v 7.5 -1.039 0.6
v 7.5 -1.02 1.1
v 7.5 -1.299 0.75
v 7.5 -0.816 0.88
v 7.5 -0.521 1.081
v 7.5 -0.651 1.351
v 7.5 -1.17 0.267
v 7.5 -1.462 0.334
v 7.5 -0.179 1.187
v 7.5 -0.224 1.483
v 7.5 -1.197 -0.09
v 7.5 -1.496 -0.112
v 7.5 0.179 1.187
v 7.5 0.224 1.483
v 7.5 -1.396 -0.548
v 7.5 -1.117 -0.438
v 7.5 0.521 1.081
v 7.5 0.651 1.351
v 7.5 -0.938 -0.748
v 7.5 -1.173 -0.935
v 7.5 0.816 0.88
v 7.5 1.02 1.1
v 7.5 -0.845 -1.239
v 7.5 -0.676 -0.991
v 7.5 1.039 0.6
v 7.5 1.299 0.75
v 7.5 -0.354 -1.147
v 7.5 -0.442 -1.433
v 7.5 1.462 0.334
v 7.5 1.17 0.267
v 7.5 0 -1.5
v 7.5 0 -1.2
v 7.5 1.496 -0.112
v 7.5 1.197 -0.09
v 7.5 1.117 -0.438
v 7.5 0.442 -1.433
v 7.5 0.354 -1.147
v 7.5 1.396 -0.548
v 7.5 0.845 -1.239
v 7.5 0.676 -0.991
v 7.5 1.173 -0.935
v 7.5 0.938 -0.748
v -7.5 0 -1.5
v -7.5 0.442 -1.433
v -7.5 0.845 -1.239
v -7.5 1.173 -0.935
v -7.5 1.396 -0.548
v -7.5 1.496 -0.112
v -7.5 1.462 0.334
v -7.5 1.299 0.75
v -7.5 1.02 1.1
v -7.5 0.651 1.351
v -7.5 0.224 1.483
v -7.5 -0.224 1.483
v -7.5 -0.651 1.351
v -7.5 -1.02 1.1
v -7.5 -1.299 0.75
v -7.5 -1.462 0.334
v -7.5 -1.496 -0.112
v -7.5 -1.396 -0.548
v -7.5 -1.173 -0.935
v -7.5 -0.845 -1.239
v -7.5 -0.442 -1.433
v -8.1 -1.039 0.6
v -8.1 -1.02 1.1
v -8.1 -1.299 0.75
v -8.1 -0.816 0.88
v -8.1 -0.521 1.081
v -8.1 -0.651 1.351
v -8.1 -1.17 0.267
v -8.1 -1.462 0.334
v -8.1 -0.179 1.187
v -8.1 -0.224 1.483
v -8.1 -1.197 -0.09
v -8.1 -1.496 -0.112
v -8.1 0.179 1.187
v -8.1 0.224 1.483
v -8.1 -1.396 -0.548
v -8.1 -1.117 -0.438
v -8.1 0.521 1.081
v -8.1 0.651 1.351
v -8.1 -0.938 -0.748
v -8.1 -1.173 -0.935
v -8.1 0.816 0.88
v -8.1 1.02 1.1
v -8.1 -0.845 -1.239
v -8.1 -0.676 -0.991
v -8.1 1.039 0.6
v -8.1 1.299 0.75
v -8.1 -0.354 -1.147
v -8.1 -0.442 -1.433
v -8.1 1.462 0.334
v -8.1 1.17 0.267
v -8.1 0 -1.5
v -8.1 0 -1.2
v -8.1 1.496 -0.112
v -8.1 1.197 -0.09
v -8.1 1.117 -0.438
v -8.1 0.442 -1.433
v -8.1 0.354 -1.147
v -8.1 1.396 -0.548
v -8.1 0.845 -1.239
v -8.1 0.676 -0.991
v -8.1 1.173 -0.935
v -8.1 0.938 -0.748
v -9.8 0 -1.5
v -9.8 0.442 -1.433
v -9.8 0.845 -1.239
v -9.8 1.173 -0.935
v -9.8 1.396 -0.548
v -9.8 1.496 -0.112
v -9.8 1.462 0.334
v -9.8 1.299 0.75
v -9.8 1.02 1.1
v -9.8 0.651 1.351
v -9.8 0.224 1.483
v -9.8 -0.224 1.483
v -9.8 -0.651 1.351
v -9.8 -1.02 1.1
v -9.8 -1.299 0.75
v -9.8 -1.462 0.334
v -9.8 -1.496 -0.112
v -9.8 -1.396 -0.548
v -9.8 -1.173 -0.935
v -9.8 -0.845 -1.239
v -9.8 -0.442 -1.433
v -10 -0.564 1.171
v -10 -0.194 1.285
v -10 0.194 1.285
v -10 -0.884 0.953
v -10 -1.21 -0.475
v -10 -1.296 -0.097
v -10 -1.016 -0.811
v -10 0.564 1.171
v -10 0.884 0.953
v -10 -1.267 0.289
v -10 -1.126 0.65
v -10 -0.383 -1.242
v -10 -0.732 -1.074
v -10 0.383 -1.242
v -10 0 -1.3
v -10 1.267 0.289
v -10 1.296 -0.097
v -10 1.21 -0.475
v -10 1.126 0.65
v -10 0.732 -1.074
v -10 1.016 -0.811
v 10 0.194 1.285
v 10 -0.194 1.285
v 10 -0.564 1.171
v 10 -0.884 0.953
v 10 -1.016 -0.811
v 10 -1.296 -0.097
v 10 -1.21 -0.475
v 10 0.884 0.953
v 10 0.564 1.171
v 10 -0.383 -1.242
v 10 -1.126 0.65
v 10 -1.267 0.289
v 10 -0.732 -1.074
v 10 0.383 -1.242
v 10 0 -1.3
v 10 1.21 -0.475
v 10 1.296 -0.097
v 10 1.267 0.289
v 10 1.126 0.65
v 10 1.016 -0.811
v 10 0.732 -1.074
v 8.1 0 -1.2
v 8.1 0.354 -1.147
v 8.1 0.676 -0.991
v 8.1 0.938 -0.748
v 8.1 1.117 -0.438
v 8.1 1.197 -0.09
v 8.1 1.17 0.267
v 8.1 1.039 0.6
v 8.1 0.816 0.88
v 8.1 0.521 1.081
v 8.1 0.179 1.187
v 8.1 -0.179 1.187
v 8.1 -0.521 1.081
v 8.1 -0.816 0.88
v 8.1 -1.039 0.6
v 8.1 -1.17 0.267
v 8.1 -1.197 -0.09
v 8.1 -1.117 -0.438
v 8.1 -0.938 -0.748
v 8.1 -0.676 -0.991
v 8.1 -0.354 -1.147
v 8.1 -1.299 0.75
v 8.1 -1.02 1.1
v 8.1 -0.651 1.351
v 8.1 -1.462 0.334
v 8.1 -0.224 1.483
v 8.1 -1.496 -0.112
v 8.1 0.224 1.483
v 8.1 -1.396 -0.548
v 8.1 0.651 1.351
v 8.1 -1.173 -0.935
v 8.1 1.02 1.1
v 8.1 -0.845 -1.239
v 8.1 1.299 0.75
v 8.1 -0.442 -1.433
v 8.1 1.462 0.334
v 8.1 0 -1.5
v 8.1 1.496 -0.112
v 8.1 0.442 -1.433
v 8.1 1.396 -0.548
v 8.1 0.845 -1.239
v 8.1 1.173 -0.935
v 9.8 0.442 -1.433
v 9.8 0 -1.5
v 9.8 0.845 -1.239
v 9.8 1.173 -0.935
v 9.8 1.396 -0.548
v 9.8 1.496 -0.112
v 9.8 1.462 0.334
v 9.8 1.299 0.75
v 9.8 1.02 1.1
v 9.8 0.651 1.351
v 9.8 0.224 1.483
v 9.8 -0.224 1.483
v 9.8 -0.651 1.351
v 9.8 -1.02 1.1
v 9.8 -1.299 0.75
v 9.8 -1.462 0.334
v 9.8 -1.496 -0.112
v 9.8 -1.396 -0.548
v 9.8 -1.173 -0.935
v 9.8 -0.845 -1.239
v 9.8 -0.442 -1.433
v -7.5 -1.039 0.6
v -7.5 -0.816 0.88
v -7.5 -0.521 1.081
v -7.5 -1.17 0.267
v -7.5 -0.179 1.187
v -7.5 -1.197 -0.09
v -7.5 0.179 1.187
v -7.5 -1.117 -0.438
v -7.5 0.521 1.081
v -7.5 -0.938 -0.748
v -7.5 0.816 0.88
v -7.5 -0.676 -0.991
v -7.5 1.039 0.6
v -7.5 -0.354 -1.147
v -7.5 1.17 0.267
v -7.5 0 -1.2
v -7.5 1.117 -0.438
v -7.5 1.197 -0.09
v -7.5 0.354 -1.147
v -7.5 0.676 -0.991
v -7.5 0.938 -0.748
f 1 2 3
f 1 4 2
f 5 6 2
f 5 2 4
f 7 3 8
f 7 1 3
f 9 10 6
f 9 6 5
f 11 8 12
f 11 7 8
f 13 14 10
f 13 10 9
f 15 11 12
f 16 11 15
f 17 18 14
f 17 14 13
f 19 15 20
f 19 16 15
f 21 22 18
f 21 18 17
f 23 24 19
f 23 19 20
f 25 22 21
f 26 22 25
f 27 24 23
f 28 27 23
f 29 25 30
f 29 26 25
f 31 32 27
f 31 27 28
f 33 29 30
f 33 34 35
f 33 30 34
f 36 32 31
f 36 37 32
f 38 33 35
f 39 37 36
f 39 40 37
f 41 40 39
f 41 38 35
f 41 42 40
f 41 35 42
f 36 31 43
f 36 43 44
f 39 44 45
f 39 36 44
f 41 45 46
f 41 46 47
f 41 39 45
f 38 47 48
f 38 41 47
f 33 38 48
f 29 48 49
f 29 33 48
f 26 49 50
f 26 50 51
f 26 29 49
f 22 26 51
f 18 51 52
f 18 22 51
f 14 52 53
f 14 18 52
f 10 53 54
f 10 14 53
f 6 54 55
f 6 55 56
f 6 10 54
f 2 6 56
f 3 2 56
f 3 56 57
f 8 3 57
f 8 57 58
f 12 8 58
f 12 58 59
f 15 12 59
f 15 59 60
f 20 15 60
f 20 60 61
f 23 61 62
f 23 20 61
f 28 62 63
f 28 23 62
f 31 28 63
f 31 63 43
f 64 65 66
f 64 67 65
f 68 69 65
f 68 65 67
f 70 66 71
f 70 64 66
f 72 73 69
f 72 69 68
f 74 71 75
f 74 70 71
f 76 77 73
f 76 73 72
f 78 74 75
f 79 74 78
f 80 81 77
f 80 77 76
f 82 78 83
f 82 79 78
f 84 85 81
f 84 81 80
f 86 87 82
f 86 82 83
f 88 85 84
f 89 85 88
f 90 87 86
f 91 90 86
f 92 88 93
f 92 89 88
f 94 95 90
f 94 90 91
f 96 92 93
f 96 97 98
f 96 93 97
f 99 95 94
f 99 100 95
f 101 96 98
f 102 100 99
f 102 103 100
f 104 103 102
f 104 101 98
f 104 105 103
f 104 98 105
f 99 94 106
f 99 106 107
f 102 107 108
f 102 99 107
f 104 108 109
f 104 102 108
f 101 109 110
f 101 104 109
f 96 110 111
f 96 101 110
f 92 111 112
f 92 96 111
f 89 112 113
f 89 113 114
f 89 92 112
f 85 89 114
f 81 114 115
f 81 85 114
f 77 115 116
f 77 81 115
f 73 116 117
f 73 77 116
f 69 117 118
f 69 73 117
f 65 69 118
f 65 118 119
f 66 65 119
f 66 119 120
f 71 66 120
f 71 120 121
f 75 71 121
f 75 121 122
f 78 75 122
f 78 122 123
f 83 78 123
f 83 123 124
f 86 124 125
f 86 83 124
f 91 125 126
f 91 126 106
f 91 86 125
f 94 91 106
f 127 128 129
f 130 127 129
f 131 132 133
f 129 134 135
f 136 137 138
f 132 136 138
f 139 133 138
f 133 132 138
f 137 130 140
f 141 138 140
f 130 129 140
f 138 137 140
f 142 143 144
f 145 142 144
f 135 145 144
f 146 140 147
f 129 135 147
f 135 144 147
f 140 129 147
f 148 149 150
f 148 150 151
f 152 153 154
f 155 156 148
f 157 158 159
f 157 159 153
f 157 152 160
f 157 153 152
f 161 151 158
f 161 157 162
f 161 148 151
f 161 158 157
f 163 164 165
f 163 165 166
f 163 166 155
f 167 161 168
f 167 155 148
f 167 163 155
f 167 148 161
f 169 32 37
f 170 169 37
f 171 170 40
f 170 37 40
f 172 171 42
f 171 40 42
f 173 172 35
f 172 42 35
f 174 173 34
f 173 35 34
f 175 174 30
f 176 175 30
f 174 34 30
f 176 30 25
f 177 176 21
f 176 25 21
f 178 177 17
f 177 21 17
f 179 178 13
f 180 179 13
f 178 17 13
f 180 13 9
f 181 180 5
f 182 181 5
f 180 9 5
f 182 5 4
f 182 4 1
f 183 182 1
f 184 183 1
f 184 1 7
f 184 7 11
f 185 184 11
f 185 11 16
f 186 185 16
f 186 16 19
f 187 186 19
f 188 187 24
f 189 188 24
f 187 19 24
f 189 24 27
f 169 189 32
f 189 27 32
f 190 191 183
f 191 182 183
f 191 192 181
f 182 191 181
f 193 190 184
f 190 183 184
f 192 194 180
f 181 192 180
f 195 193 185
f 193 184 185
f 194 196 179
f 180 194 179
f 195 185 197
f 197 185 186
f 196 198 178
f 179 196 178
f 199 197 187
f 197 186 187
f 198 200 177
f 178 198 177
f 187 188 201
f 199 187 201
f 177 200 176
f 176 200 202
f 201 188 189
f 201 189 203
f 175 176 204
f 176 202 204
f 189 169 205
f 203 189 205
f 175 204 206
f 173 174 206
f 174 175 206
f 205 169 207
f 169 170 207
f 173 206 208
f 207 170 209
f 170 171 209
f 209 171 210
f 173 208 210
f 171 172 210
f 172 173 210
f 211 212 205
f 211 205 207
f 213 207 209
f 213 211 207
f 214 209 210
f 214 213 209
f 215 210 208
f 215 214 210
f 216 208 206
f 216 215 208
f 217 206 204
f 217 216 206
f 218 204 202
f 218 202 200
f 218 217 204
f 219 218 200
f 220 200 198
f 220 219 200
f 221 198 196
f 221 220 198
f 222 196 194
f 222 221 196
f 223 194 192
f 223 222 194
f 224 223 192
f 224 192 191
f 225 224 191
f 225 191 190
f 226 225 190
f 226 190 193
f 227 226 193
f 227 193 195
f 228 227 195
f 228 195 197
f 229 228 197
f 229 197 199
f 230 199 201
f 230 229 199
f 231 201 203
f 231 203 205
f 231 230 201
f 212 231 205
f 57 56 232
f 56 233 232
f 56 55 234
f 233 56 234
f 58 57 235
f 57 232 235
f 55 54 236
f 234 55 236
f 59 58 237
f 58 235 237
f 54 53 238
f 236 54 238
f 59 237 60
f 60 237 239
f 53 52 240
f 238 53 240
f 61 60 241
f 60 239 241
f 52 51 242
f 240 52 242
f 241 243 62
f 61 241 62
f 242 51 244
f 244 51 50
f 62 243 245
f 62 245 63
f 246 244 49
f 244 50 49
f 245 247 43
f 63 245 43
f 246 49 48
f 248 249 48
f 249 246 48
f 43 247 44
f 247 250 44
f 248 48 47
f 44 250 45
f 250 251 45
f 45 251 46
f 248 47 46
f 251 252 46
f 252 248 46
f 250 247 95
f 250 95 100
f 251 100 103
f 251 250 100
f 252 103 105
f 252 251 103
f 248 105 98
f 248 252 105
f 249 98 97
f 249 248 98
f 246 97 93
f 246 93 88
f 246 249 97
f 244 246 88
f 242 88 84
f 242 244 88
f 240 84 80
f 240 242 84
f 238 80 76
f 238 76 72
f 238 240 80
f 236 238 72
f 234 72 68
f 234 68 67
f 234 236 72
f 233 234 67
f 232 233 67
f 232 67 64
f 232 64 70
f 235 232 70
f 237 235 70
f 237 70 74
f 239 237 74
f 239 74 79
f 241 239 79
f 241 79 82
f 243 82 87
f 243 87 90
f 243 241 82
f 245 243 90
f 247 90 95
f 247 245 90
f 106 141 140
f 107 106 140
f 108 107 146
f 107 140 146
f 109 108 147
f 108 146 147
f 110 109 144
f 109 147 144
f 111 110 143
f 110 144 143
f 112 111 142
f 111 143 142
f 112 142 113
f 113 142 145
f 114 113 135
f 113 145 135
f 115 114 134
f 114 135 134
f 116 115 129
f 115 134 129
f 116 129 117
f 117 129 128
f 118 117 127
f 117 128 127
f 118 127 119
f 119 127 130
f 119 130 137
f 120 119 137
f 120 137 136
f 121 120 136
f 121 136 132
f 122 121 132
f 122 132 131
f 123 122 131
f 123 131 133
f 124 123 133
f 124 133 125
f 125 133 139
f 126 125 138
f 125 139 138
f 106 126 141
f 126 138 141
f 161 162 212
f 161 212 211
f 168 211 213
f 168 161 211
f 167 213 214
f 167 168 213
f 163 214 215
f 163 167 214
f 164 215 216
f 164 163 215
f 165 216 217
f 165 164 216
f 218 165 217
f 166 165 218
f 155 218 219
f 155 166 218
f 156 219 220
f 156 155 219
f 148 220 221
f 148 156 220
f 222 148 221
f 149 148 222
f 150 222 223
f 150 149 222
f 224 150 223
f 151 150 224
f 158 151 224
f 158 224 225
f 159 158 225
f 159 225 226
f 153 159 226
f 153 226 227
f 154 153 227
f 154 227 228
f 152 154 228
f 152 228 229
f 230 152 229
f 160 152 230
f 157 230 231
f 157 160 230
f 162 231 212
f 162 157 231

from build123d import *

# Parameters (mm, degrees)
SKETCH_2_R          = 1.5
EXTRUDE_1_DEPTH     = 10
CUT_EXTRUDE_START   = -7.5
SKETCH_3_R          = 1.5
SKETCH_3_R_2        = 1.2
CUT_EXTRUDE_1_DEPTH = 0.6
CHAMFER_1_SIZE      = 0.2


with BuildPart() as part:
    # 草图2 → 凸台-拉伸1 (new body, symmetric)
    with BuildSketch(Plane(origin=(0, 0, 0), x_dir=(0, 0, -1), z_dir=(1, 0, 0))):
        Circle(SKETCH_2_R)
    extrude(amount=EXTRUDE_1_DEPTH, both=True)

    # 草图3 → 切除-拉伸1 (cut)
    with BuildSketch(Plane(origin=(0, 0, 0), x_dir=(0, 0, -1), z_dir=(1, 0, 0)).offset(CUT_EXTRUDE_START)):
        Circle(SKETCH_3_R)
        Circle(SKETCH_3_R_2, mode=Mode.SUBTRACT)
    cut_extrude_1 = extrude(amount=-CUT_EXTRUDE_1_DEPTH, mode=Mode.SUBTRACT)

    # 镜向1: 切除-拉伸1 across plane
    add(cut_extrude_1.mirror(Plane(origin=(0, 0, 0), x_dir=(0, 0, 1), z_dir=(1, 0, 0))), mode=Mode.SUBTRACT)

    # 倒角1
    chamfer_1_edges = [part.edges().sort_by_distance(p)[0] for p in [
        (-10, 0, 1.5),
        (10, 0, 1.5),
    ]]
    chamfer(chamfer_1_edges, length=CHAMFER_1_SIZE)


solid = part.part
